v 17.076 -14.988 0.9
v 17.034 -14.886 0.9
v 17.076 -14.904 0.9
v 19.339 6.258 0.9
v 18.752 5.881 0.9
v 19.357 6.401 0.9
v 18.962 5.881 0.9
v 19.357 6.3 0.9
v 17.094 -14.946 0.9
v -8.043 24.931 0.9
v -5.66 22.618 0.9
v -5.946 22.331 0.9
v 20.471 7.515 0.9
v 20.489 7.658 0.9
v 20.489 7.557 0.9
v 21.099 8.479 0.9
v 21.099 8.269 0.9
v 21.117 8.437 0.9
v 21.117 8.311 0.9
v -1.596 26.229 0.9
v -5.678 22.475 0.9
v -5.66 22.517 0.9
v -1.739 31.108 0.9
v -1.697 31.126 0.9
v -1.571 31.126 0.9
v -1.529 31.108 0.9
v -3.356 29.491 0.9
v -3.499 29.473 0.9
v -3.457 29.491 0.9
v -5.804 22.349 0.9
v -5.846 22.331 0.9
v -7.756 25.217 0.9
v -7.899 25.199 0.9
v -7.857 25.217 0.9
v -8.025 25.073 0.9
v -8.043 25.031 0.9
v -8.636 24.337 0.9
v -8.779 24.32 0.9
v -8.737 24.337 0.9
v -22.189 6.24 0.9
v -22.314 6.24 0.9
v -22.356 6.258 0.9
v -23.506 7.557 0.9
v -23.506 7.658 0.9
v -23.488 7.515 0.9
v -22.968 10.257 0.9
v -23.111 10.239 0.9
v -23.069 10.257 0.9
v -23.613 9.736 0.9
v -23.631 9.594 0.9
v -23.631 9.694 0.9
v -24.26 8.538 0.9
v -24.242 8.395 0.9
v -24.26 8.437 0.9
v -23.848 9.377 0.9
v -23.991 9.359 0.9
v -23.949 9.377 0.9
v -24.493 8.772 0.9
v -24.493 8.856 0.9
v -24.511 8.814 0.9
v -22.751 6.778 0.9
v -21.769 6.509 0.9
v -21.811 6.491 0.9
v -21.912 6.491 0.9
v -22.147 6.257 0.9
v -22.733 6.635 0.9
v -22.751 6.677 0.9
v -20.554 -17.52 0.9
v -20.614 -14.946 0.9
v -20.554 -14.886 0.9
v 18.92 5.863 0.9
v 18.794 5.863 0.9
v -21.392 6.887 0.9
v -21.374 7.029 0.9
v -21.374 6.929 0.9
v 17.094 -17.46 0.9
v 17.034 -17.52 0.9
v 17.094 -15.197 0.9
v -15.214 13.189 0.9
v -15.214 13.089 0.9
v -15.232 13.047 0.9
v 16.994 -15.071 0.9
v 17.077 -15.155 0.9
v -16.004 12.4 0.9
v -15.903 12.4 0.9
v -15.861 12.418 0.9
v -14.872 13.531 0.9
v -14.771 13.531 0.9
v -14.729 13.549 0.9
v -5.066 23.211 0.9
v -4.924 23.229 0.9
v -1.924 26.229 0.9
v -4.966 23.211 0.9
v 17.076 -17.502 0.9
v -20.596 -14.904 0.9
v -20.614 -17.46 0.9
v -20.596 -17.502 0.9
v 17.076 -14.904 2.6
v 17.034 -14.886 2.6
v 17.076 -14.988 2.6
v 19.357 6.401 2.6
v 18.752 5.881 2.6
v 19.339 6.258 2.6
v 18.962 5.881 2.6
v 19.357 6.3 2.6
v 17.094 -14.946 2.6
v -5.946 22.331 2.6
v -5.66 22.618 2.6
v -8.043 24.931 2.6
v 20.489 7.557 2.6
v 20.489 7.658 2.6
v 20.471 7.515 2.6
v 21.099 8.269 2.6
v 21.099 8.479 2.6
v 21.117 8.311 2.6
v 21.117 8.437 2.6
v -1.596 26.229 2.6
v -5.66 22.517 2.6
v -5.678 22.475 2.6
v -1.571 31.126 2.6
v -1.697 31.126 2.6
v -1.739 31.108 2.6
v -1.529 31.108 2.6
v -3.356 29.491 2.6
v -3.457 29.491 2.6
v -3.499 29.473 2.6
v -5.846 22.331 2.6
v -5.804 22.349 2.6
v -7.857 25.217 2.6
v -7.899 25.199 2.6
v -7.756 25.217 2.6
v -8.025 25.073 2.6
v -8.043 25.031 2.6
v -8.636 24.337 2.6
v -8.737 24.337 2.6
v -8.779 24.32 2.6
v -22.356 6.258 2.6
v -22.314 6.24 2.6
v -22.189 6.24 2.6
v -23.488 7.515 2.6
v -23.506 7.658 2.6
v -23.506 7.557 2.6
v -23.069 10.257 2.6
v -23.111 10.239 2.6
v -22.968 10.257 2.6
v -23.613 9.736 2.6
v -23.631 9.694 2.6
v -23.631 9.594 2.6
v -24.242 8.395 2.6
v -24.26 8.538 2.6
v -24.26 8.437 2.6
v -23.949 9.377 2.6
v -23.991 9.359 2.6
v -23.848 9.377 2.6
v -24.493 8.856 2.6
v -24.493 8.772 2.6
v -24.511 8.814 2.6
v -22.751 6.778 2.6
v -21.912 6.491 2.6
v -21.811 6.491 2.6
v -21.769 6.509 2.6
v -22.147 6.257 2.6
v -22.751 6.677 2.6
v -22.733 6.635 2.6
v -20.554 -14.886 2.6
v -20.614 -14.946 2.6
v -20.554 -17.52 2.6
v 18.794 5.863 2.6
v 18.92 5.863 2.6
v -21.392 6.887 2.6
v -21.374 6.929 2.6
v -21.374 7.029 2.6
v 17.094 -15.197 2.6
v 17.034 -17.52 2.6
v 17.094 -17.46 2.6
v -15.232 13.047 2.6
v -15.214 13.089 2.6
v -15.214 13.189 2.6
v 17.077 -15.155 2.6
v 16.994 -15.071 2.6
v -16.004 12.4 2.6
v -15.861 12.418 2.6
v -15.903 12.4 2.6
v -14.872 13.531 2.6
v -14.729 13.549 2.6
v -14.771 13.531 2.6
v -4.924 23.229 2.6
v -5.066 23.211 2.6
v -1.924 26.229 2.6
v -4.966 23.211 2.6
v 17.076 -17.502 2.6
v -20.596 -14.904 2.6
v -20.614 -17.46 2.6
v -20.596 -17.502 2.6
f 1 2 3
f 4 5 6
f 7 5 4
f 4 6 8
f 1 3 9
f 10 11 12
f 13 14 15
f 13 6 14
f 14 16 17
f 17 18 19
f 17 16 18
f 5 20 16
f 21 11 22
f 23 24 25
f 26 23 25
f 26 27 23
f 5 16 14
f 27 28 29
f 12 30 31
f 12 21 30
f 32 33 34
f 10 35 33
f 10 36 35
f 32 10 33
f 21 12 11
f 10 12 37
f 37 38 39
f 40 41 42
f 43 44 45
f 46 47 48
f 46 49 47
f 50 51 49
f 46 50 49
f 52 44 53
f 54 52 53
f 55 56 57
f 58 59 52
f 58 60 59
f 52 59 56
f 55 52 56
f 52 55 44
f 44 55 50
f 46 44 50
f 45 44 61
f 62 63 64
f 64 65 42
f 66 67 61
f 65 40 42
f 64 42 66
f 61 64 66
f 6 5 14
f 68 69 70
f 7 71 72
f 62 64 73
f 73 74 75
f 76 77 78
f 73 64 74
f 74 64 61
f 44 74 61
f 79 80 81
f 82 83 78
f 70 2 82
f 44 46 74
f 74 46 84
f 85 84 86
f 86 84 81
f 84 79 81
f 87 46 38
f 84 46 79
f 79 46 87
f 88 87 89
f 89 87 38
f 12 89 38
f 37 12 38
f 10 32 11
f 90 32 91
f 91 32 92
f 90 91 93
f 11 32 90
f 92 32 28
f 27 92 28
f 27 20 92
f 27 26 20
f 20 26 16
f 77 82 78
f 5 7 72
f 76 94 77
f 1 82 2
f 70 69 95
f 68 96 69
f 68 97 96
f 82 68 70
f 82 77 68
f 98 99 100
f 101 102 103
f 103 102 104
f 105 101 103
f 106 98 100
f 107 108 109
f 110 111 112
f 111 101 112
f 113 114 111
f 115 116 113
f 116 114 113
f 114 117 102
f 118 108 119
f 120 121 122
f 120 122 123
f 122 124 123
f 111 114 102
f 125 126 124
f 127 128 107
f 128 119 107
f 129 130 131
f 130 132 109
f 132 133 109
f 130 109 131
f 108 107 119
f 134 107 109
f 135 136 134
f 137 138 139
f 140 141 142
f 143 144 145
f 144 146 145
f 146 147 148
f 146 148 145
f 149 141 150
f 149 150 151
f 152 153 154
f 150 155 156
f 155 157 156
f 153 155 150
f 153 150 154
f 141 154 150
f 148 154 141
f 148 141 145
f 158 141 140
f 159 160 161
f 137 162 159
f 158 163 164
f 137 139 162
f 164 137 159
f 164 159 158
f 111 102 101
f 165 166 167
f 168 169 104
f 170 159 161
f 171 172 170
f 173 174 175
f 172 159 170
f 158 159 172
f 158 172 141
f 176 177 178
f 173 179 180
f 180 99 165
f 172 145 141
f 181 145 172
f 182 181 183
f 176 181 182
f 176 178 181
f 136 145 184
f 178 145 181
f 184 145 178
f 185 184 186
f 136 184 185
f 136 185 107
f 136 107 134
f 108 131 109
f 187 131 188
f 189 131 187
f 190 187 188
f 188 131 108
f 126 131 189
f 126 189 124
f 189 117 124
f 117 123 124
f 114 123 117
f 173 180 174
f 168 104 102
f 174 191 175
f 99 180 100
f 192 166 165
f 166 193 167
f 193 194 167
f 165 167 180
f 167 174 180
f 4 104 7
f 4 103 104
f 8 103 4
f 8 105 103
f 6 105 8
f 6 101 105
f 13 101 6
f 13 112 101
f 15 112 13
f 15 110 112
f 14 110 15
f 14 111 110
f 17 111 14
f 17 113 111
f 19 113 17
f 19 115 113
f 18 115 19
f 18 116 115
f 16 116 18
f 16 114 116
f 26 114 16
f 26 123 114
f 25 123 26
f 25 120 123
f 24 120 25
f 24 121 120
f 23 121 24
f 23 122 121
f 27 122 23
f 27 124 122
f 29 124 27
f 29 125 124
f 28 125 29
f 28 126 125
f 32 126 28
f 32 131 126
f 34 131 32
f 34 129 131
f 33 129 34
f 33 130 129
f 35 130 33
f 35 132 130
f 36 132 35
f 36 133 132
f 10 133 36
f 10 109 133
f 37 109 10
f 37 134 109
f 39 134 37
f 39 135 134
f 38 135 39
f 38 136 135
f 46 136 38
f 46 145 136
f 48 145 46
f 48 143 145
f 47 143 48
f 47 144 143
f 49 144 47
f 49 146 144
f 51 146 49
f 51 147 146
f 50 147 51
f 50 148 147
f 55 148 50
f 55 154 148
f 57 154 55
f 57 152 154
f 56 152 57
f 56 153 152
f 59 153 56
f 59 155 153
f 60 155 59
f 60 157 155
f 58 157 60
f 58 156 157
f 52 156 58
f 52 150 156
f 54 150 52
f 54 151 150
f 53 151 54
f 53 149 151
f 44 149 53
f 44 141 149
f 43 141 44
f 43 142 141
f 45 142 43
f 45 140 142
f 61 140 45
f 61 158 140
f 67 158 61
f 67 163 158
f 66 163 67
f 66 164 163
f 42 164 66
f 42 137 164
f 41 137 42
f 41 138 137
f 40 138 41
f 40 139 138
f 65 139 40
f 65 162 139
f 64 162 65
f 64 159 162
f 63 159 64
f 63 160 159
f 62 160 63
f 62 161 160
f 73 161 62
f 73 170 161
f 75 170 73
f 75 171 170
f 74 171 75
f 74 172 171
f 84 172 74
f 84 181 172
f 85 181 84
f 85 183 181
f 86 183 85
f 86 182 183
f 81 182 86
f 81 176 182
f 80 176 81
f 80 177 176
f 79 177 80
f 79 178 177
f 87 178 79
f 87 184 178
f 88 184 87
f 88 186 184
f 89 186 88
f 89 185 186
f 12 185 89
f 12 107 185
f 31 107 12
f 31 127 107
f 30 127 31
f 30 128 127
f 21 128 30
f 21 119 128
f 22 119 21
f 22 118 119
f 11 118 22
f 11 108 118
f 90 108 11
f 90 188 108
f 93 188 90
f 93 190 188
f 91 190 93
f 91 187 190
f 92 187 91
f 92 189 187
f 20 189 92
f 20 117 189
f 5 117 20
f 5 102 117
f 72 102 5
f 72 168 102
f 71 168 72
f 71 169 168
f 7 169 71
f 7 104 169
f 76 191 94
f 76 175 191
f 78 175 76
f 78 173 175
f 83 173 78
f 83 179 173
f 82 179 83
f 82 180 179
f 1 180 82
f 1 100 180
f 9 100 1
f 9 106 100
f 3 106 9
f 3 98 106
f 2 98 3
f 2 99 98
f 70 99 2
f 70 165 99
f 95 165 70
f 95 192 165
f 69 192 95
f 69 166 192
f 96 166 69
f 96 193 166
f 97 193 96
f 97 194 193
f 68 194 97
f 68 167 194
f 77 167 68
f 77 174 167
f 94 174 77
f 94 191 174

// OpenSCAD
$fn = 24;
translate([0, -2.500, 0.900])
  linear_extrude(height=1.700) {
offset(r=0.06, $fn=8) {
    polygon(points=[[-20.554,-12.446],[-20.554,-14.960],[17.034,-14.960],[17.034,-12.697],[16.909,-12.571],[17.034,-12.446]], paths=[[0,1,2,3,4,5]]);
    polygon(points=[[-24.451,11.314],[-24.200,11.063],[-24.200,10.937],[-23.446,10.183],[-23.446,10.057],[-22.691,9.303],[-22.691,9.177],[-22.314,8.800],[-22.189,8.800],[-21.937,9.051],[-21.811,9.051],[-21.434,9.429],[-21.434,9.554],[-16.029,14.960],[-15.903,14.960],[-15.274,15.589],[-15.274,15.714],[-14.897,16.091],[-14.771,16.091],[-5.971,24.891],[-5.846,24.891],[-5.720,25.017],[-5.720,25.143],[-5.091,25.771],[-4.966,25.771],[-1.949,28.789],[-1.571,28.789],[18.794,8.423],[18.920,8.423],[19.297,8.800],[19.297,8.926],[20.429,10.057],[20.429,10.183],[21.057,10.811],[21.057,10.937],[-1.571,33.566],[-1.697,33.566],[-3.331,31.931],[-3.457,31.931],[-7.731,27.657],[-7.857,27.657],[-7.983,27.531],[-7.983,27.406],[-8.611,26.777],[-8.737,26.777],[-22.943,12.697],[-23.069,12.697],[-23.571,12.194],[-23.571,12.069],[-23.823,11.817],[-23.949,11.817]], paths=[[0,1,2,3,4,5,6,7,8,9,10,11,12,13,14,15,16,17,18,19,20,21,22,23,24,25,26,27,28,29,30,31,32,33,34,35,36,37,38,39,40,41,42,43,44,45,46,47,48,49,50]]);
}
}
